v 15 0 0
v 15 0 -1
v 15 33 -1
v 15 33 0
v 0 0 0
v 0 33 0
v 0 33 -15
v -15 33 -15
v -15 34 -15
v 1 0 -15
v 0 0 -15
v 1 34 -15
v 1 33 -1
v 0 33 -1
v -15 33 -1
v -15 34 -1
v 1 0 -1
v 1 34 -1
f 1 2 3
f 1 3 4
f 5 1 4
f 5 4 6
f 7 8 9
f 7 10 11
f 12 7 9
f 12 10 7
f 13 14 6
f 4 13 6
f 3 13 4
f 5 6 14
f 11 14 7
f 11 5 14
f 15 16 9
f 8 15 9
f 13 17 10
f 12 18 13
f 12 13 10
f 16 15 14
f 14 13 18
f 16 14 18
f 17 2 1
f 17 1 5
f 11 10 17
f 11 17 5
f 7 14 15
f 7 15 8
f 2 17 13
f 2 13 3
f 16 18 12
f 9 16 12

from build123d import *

# Parameters (mm, degrees)
EXTRUDE_1_DEPTH     = 53
CUT_EXTRUDE_2_DEPTH = 20
SKETCH_6_W          = 14
SKETCH_6_H          = 1
EXTRUDE_2_DEPTH     = 16


with BuildPart() as part:
    # Эскиз1 → Бобышка-Вытянуть1 (new body)
    with BuildSketch(Plane(origin=(0, 0, 0), x_dir=(1, 0, 0), z_dir=(0, 1, 0))):
        Polygon((0, 0), (0, 15), (1, 15), (1, 1), (15, 1), (15, 0), align=None)
    extrude(amount=EXTRUDE_1_DEPTH)

    # Эскиз5 → Вырез-Вытянуть2 (cut)
    with BuildSketch(Plane(origin=(0, 53, 0), x_dir=(1, 0, 0), z_dir=(0, 1, 0))):
        Polygon((0, 0), (15, 0), (15, 1), (1, 1), (1, 15), (0, 15), align=None)
    extrude(amount=-CUT_EXTRUDE_2_DEPTH, mode=Mode.SUBTRACT)

    # Эскиз6 → Бобышка-Вытянуть2 (add)
    with BuildSketch(Plane(origin=(1, 0, 0), x_dir=(0, 0, -1), z_dir=(1, 0, 0))):
        with Locations((8, 33.5)):
            Rectangle(SKETCH_6_W, SKETCH_6_H)
    extrude(amount=-EXTRUDE_2_DEPTH)


solid = part.part
